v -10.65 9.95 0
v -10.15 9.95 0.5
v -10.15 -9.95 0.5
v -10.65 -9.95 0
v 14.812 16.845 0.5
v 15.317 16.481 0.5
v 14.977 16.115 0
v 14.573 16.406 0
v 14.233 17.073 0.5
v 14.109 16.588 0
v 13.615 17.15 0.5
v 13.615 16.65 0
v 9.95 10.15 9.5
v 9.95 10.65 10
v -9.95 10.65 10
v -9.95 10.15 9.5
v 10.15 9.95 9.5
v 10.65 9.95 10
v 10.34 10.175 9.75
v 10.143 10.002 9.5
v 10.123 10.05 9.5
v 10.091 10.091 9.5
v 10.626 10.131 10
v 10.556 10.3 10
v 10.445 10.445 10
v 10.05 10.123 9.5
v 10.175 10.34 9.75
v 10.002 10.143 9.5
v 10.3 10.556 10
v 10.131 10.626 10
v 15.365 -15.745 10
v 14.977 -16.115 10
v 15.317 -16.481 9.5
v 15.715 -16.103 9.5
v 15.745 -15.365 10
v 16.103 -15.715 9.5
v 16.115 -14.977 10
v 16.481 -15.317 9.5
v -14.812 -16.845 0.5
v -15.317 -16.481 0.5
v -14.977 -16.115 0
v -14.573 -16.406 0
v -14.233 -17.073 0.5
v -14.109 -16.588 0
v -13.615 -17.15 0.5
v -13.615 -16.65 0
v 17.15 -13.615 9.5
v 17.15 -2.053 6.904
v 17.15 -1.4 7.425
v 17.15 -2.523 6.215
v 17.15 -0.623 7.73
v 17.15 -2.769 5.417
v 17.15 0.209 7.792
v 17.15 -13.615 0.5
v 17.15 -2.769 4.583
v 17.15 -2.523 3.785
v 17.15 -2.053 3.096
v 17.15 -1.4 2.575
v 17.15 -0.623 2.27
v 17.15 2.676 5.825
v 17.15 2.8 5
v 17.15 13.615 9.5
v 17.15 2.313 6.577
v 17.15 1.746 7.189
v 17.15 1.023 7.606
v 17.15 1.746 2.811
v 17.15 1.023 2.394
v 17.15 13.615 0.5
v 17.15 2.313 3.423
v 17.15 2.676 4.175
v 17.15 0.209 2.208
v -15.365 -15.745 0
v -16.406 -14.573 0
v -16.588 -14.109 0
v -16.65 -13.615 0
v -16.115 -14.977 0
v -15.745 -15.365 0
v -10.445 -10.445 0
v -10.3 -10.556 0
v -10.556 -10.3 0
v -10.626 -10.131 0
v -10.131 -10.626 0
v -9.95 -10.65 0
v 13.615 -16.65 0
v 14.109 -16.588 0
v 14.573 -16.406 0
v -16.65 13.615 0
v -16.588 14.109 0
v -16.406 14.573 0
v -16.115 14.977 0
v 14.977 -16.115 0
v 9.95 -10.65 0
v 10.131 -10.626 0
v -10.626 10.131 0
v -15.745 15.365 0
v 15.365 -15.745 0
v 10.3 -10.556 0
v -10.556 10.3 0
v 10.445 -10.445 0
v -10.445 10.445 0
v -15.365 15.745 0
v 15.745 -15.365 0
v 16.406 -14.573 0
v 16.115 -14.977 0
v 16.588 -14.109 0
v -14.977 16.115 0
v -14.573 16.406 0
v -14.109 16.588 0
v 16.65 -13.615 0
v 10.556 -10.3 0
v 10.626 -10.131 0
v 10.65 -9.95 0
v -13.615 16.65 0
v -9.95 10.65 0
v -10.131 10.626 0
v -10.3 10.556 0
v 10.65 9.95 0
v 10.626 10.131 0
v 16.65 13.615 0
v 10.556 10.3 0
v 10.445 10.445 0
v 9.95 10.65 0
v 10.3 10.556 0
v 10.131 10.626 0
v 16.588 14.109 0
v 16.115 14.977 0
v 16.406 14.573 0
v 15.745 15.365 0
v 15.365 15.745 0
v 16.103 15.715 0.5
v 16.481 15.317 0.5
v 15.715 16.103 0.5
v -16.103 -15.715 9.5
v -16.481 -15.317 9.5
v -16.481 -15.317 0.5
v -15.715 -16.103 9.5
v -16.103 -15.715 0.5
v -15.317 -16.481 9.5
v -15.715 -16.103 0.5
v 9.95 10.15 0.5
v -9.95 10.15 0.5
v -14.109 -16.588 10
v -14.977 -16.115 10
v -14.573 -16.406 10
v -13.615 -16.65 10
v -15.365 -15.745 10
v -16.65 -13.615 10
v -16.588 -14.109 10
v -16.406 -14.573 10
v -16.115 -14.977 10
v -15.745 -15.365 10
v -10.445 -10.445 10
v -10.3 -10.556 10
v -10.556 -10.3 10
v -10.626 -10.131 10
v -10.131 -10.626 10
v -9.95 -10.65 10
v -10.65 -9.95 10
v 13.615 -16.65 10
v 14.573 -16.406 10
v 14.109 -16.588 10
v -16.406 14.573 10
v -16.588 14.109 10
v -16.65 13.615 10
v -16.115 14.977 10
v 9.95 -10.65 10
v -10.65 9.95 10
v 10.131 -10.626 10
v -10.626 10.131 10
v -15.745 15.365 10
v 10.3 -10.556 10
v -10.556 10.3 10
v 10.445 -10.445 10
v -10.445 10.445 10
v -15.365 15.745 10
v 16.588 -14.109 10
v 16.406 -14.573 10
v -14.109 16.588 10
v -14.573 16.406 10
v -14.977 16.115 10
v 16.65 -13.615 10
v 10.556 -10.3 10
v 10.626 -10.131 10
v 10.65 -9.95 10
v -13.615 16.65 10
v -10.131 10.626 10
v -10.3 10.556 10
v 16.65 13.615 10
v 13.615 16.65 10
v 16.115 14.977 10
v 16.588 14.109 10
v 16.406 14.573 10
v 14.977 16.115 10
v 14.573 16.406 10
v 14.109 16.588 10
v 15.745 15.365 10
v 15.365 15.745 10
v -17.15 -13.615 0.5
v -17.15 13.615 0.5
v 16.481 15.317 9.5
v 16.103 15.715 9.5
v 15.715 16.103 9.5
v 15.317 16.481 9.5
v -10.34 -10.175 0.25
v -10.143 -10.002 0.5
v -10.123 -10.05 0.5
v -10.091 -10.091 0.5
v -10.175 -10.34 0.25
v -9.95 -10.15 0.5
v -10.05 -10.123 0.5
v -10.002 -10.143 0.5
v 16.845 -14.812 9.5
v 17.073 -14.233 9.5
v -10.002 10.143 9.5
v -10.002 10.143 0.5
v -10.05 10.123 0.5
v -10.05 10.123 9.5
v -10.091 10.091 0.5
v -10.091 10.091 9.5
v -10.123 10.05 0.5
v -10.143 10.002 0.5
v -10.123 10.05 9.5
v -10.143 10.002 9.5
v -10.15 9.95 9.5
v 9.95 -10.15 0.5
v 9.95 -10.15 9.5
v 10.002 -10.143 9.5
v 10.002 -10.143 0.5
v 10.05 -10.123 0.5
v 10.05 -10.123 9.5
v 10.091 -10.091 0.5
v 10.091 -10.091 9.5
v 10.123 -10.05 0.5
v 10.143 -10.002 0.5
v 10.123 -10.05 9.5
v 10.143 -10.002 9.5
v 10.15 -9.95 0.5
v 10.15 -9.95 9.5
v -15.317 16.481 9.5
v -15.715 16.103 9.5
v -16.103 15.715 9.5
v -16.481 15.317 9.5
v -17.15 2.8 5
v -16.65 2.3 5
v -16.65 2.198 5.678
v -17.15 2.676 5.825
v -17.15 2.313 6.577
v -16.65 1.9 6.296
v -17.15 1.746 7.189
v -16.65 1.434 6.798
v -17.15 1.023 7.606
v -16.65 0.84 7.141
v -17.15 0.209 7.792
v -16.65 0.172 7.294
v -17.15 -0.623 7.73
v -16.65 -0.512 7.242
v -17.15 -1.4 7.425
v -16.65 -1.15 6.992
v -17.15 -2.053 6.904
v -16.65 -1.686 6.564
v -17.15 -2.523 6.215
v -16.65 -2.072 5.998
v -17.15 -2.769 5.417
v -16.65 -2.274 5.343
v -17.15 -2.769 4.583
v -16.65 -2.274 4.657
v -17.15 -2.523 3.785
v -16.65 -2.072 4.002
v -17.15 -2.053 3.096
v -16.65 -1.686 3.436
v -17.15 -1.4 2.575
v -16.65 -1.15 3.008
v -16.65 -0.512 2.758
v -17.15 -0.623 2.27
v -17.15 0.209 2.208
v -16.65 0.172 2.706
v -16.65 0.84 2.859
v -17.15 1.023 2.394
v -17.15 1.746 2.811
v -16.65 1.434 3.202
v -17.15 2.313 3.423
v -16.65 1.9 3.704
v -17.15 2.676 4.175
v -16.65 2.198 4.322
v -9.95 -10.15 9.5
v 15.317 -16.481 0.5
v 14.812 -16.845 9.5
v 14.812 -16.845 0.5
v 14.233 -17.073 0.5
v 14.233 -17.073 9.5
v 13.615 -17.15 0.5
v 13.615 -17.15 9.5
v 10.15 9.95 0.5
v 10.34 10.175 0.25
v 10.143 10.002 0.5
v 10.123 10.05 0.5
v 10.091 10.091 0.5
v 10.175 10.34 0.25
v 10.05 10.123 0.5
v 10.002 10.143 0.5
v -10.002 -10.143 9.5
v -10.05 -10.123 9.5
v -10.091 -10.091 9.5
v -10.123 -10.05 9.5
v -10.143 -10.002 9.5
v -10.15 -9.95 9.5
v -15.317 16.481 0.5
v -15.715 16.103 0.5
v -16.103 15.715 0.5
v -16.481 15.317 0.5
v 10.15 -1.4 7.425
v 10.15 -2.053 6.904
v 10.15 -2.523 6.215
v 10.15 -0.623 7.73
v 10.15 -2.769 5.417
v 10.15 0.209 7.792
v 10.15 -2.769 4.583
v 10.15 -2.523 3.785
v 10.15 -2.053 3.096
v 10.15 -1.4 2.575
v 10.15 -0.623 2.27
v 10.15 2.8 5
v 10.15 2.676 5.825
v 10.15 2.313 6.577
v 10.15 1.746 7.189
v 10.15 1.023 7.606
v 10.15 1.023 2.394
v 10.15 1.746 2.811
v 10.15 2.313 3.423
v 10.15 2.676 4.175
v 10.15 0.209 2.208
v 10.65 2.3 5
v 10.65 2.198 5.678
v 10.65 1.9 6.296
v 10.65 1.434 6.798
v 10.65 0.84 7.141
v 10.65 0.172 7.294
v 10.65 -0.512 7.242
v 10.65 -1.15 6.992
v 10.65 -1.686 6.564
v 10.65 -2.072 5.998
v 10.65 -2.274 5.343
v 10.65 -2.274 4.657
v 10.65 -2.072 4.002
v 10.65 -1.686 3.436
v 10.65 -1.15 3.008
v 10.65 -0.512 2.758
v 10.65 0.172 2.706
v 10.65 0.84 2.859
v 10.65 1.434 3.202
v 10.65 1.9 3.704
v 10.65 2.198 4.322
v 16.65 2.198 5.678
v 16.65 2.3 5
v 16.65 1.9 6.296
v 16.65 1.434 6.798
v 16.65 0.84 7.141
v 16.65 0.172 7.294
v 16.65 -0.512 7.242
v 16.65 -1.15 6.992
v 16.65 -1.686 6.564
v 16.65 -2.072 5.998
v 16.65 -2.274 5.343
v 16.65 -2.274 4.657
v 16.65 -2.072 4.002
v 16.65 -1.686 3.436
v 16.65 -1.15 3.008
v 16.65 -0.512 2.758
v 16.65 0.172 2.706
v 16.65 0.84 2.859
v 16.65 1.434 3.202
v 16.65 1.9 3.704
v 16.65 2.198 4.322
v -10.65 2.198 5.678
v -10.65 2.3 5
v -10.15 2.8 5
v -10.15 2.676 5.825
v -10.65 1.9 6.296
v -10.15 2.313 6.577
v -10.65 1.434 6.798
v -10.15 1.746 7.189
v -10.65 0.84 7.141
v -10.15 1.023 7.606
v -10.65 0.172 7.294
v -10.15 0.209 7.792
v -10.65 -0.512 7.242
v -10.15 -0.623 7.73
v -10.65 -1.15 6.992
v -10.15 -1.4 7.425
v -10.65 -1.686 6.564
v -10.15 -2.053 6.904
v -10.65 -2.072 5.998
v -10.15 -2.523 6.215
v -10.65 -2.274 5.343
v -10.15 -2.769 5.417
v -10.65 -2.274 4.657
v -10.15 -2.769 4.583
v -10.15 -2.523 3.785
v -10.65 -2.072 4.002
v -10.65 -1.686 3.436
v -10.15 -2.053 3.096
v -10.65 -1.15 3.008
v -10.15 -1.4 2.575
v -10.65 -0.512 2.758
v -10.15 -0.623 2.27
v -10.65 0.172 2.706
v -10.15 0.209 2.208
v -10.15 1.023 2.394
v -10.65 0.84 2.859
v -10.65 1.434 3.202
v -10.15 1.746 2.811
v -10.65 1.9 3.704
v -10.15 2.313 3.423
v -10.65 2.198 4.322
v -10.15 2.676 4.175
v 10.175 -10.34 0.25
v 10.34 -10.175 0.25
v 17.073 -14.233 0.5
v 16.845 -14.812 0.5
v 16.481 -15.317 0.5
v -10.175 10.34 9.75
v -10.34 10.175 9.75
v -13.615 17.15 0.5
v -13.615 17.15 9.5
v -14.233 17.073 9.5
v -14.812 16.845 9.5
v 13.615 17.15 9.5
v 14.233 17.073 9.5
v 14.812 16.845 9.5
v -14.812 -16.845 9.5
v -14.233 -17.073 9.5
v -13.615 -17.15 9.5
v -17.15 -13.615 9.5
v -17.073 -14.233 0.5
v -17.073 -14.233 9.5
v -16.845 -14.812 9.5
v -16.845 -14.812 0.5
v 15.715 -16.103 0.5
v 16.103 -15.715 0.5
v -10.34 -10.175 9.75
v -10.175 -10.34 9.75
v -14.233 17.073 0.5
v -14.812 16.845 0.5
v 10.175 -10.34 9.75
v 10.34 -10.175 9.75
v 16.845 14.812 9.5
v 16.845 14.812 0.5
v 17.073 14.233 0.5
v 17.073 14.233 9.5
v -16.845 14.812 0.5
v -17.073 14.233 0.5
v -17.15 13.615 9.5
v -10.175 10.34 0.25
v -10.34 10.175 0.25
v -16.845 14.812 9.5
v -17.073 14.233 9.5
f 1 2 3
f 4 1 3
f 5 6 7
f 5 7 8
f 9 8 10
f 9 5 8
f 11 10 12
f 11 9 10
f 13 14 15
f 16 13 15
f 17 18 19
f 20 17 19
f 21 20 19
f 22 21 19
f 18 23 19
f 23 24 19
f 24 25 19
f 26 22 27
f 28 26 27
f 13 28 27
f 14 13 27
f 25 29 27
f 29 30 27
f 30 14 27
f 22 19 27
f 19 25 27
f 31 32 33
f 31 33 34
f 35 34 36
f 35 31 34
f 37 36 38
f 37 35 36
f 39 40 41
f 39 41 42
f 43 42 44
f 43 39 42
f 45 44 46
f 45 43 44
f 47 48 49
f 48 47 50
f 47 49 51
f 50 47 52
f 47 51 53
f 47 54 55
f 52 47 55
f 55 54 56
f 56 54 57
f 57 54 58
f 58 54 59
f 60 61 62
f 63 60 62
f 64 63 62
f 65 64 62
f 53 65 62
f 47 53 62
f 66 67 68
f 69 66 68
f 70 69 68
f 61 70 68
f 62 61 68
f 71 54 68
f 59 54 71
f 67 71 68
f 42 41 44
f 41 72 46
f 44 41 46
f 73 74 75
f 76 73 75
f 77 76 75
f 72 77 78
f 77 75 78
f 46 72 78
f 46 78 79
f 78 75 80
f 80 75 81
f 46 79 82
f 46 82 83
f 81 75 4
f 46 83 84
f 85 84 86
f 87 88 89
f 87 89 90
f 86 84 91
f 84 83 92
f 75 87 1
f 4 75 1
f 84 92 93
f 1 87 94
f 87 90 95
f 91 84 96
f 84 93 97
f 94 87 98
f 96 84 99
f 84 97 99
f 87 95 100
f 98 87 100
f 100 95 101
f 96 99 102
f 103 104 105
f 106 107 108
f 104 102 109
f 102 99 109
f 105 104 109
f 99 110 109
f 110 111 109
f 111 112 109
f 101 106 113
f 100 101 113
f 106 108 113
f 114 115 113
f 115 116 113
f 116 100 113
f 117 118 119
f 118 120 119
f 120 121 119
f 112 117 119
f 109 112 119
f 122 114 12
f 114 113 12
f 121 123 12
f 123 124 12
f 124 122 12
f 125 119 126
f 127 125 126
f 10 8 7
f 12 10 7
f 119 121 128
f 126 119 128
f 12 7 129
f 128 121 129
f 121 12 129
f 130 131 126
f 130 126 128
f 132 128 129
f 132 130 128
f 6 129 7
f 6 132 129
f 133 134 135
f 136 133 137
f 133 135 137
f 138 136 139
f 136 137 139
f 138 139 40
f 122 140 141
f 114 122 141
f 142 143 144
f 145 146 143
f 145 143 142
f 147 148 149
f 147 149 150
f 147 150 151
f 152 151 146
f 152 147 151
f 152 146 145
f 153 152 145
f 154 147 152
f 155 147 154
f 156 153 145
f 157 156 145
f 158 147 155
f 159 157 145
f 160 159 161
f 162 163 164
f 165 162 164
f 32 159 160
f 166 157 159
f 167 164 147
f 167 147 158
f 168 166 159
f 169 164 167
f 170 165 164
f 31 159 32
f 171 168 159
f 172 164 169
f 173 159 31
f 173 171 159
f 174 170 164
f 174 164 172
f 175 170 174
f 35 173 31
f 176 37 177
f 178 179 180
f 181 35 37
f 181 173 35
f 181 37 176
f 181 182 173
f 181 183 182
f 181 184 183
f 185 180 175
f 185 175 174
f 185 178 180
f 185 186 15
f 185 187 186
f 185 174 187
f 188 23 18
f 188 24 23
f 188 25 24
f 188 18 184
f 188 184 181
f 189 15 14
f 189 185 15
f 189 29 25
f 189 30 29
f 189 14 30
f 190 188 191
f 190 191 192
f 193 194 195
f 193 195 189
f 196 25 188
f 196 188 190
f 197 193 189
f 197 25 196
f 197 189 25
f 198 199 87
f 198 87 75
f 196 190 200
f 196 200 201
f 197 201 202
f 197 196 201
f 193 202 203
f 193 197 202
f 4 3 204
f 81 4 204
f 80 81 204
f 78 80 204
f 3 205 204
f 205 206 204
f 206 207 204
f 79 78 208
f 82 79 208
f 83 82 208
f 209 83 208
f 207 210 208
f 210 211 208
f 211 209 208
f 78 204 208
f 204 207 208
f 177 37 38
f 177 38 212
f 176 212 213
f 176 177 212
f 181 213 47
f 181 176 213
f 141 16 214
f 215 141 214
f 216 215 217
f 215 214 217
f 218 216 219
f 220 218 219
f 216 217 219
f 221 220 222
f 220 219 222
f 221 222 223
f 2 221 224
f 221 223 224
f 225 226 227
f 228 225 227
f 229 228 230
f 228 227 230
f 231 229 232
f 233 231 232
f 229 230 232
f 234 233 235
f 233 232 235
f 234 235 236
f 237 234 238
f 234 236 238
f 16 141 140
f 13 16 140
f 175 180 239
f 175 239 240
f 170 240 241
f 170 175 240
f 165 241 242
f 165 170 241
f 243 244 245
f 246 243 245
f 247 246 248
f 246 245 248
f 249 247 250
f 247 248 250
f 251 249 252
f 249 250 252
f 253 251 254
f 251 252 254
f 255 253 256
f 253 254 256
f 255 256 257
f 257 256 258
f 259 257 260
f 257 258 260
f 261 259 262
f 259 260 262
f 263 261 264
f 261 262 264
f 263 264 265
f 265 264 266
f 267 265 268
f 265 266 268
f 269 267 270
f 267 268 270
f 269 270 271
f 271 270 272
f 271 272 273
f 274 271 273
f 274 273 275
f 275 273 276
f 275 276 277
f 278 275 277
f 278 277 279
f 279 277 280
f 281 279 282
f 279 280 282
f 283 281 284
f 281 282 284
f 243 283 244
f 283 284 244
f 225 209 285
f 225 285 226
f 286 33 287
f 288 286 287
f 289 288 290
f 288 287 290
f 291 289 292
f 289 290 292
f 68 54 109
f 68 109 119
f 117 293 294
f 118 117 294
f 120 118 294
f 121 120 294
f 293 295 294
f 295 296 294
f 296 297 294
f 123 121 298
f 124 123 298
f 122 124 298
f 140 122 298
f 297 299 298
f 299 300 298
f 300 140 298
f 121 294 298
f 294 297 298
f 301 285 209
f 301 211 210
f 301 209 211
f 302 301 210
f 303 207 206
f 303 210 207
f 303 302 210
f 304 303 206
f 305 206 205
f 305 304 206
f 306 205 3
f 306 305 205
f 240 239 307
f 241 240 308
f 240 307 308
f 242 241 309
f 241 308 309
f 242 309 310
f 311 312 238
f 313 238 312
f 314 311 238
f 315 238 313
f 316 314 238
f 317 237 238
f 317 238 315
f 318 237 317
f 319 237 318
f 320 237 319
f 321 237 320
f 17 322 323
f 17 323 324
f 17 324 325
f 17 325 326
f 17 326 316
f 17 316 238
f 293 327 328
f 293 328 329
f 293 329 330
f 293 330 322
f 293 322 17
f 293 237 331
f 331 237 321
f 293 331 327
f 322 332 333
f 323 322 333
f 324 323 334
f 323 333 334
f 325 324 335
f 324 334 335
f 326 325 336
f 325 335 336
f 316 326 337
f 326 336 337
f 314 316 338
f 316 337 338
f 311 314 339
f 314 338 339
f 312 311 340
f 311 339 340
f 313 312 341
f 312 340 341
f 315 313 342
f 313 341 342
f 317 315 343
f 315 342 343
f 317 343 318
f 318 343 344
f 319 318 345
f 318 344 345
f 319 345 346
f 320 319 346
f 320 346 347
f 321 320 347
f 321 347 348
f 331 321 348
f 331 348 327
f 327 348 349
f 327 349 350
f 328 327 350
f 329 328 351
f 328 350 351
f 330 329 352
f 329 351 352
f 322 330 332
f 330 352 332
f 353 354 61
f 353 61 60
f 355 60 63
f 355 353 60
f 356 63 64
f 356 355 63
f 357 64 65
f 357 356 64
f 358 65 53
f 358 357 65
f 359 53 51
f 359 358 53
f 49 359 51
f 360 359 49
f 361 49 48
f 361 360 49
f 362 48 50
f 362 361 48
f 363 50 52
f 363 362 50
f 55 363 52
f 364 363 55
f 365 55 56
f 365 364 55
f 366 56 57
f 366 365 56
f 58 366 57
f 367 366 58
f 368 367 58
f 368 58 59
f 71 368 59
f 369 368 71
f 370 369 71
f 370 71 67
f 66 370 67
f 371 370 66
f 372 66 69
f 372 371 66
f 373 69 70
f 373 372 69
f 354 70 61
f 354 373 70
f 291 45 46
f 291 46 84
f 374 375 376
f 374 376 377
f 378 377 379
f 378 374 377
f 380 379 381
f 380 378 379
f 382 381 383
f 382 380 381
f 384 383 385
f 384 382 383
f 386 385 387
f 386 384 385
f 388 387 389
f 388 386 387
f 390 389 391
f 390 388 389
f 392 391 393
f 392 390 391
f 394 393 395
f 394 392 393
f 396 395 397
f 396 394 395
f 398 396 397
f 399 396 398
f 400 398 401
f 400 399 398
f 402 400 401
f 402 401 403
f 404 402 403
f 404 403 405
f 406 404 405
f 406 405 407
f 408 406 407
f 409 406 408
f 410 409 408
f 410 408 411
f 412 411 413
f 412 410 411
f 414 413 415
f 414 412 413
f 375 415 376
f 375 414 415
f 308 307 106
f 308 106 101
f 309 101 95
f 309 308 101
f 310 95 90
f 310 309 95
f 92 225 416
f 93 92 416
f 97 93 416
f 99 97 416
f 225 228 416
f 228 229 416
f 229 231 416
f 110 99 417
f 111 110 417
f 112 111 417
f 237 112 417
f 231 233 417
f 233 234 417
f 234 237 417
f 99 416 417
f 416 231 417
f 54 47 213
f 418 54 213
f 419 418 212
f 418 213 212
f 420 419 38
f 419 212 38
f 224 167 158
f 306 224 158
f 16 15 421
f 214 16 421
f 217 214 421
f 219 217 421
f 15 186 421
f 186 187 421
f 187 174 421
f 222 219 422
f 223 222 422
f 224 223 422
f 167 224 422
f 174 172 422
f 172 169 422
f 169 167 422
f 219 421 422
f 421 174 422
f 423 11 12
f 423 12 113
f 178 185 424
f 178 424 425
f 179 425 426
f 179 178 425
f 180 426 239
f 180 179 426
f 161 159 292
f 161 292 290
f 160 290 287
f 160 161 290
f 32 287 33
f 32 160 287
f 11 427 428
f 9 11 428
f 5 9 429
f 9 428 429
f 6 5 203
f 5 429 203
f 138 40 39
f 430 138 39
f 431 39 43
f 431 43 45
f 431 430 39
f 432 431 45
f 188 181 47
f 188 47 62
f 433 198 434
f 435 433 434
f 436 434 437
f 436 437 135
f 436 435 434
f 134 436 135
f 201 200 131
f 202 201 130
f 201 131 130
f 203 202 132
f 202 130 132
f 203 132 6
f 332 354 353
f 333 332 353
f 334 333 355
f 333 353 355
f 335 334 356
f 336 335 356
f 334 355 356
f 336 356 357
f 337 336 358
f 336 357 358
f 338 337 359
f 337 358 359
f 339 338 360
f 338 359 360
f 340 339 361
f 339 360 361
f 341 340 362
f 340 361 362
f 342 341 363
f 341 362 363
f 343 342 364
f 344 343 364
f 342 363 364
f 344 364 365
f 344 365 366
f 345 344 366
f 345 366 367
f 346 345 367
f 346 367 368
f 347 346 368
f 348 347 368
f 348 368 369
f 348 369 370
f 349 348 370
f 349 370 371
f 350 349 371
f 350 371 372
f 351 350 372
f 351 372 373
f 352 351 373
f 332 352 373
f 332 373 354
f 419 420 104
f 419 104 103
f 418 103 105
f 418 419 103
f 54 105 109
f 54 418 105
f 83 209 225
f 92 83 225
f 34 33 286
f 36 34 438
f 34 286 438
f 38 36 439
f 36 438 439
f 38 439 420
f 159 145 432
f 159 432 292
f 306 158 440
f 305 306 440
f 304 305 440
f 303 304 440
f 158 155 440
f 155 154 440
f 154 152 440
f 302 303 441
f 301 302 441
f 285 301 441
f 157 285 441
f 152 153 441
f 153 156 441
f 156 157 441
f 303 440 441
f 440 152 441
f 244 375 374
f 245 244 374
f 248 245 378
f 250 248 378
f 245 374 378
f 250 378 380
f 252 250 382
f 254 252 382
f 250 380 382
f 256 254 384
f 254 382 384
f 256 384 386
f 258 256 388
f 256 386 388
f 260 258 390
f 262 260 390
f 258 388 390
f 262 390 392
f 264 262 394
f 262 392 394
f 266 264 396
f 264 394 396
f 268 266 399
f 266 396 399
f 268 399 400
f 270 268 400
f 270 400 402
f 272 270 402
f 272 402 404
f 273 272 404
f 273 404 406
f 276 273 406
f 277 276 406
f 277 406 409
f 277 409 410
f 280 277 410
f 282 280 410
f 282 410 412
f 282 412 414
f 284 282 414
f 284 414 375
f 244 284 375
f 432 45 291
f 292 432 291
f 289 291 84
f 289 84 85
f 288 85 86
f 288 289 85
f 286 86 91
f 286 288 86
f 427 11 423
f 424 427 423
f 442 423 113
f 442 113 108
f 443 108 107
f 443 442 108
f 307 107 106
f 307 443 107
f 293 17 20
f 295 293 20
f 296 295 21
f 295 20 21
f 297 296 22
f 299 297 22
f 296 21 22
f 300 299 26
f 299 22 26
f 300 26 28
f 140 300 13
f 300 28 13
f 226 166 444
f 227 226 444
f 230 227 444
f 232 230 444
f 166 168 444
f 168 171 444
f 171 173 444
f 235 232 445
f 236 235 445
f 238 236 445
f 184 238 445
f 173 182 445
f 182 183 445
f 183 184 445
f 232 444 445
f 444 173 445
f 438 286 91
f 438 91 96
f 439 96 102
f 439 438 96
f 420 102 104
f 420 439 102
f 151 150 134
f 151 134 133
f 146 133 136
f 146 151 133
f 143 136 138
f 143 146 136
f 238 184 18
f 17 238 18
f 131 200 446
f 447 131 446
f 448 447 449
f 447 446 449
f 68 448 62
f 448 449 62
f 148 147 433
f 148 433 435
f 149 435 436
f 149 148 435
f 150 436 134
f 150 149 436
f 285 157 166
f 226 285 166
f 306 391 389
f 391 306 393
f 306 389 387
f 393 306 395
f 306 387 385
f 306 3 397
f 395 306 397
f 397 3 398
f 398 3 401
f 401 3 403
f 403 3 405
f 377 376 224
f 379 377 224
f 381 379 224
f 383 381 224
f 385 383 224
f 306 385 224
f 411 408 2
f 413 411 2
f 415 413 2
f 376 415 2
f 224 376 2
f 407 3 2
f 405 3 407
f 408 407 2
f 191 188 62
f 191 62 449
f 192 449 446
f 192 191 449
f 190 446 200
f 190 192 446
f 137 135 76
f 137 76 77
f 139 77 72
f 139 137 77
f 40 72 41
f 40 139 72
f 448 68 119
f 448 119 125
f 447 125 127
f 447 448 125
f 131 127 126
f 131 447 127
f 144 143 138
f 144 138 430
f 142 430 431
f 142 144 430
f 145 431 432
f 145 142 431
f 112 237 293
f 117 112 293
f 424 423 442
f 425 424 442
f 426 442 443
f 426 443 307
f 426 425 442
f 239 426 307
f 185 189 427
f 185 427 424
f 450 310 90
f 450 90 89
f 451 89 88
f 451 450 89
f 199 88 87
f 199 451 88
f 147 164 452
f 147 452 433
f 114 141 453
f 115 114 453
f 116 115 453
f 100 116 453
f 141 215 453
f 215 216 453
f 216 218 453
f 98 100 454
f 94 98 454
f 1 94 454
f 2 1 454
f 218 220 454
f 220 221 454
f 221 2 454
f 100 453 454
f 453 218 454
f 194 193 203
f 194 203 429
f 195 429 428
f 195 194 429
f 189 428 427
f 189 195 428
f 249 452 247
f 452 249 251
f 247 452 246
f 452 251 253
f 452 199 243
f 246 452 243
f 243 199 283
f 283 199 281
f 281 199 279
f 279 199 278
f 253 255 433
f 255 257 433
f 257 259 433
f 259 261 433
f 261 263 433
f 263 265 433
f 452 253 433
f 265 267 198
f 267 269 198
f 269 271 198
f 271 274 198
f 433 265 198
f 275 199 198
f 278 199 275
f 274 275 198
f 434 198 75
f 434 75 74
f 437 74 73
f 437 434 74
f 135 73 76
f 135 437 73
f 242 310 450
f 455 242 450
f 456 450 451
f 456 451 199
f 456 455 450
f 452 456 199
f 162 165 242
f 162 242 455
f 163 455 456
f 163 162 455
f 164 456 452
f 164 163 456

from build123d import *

# Parameters (mm, degrees)
SKIZZE1_W                       = 20.3
SKIZZE1_H                       = 20.3
AUFSATZ_LINEAR_AUSTRAGEN1_DEPTH = 10
VERRUNDUNG1_R                   = 0.2
VERRUNDUNG2_R                   = 2.5
SKIZZE2_R                       = 2.3
SCHNITT_LINEAR_AUSTRAGEN1_DEPTH = 40.630953811
FASE2_SIZE                      = 0.5


with BuildPart() as part:
    # Skizze1 → Aufsatz-Linear austragen1 (new body)
    with BuildSketch(Plane.XY):
        with BuildLine():
            Line((14.564597488, 17.15), (-14.564597488, 17.15))
            ThreePointArc((-14.564597488, 17.15), (-15.909902577, 15.909902577), (-17.15, 14.564597488))
            Line((-17.15, 14.564597488), (-17.15, -14.564597488))
            ThreePointArc((-17.15, -14.564597488), (-15.909902577, -15.909902577), (-14.564597488, -17.15))
            Line((-14.564597488, -17.15), (14.564597488, -17.15))
            ThreePointArc((14.564597488, -17.15), (15.909902577, -15.909902577), (17.15, -14.564597488))
            Line((17.15, -14.564597488), (17.15, 14.564597488))
            ThreePointArc((17.15, 14.564597488), (15.909902577, 15.909902577), (14.564597488, 17.15))
        make_face()
        Rectangle(SKIZZE1_W, SKIZZE1_H, mode=Mode.SUBTRACT)
    extrude(amount=AUFSATZ_LINEAR_AUSTRAGEN1_DEPTH)

    # Verrundung1
    verrundung1_edges = [part.edges().sort_by_distance(p)[0] for p in [
        (10.15, -10.15, 5),
        (10.15, 10.15, 5),
        (-10.15, 10.15, 5),
        (-10.15, -10.15, 5),
    ]]
    fillet(verrundung1_edges, radius=VERRUNDUNG1_R)

    # Verrundung2
    verrundung2_edges = [part.edges().sort_by_distance(p)[0] for p in [
        (17.15, 14.564597488, 5),
        (17.15, -14.564597488, 5),
        (14.564597488, -17.15, 5),
        (-14.564597488, -17.15, 5),
        (-17.15, -14.564597488, 5),
        (-17.15, 14.564597488, 5),
        (-14.564597488, 17.15, 5),
        (14.564597488, 17.15, 5),
    ]]
    fillet(verrundung2_edges, radius=VERRUNDUNG2_R)

    # Skizze2 → Schnitt-Linear austragen1 (cut, through all)
    with BuildSketch(Plane(origin=(17.15, 0, 0), x_dir=(0, 0, -1), z_dir=(1, 0, 0))):
        with Locations(Location((-5, 0, 0), (0, 0, 90))):
            Circle(SKIZZE2_R)
    extrude(amount=-SCHNITT_LINEAR_AUSTRAGEN1_DEPTH, mode=Mode.SUBTRACT)

    # Fase2
    fase2_edges = [part.edges().sort_by_distance(p)[0] for p in [
        (-10.15, -2.3, 5),
        (10.15, -2.3, 5),
        (-17.15, -2.3, 5),
        (17.15, -2.3, 5),
        (0, -10.15, 0),
        (0, -10.15, 10),
        (10.15, 0, 0),
        (10.15, 0, 10),
        (-10.15, 0, 0),
        (-10.15, 0, 10),
        (0, 10.15, 0),
        (0, 10.15, 10),
        (10.091421356, -10.091421356, 0),
        (10.091421356, -10.091421356, 10),
        (-10.091421356, -10.091421356, 0),
        (-10.091421356, -10.091421356, 10),
        (-10.091421356, 10.091421356, 0),
        (-10.091421356, 10.091421356, 10),
        (10.091421356, 10.091421356, 0),
        (10.091421356, 10.091421356, 10),
        (0, 17.15, 0),
        (0, 17.15, 10),
        (15.909902577, 15.909902577, 0),
        (17.15, 0, 0),
        (15.909902577, -15.909902577, 0),
        (0, -17.15, 0),
        (-15.909902577, -15.909902577, 0),
        (-17.15, 0, 0),
        (-15.909902577, 15.909902577, 0),
        (-14.52963679, 16.976813809, 0),
        (-16.976813809, 14.52963679, 0),
        (-16.976813809, -14.52963679, 0),
        (-14.52963679, -16.976813809, 0),
        (14.52963679, -16.976813809, 0),
        (16.976813809, -14.52963679, 0),
        (16.976813809, 14.52963679, 0),
        (14.52963679, 16.976813809, 0),
        (15.909902577, 15.909902577, 10),
        (-15.909902577, 15.909902577, 10),
        (-17.15, 0, 10),
        (-15.909902577, -15.909902577, 10),
        (0, -17.15, 10),
        (15.909902577, -15.909902577, 10),
        (17.15, 0, 10),
        (-14.52963679, 16.976813809, 10),
        (-16.976813809, 14.52963679, 10),
        (-16.976813809, -14.52963679, 10),
        (-14.52963679, -16.976813809, 10),
        (14.52963679, -16.976813809, 10),
        (16.976813809, -14.52963679, 10),
        (16.976813809, 14.52963679, 10),
        (14.52963679, 16.976813809, 10),
    ]]
    chamfer(fase2_edges, length=FASE2_SIZE)


solid = part.part
